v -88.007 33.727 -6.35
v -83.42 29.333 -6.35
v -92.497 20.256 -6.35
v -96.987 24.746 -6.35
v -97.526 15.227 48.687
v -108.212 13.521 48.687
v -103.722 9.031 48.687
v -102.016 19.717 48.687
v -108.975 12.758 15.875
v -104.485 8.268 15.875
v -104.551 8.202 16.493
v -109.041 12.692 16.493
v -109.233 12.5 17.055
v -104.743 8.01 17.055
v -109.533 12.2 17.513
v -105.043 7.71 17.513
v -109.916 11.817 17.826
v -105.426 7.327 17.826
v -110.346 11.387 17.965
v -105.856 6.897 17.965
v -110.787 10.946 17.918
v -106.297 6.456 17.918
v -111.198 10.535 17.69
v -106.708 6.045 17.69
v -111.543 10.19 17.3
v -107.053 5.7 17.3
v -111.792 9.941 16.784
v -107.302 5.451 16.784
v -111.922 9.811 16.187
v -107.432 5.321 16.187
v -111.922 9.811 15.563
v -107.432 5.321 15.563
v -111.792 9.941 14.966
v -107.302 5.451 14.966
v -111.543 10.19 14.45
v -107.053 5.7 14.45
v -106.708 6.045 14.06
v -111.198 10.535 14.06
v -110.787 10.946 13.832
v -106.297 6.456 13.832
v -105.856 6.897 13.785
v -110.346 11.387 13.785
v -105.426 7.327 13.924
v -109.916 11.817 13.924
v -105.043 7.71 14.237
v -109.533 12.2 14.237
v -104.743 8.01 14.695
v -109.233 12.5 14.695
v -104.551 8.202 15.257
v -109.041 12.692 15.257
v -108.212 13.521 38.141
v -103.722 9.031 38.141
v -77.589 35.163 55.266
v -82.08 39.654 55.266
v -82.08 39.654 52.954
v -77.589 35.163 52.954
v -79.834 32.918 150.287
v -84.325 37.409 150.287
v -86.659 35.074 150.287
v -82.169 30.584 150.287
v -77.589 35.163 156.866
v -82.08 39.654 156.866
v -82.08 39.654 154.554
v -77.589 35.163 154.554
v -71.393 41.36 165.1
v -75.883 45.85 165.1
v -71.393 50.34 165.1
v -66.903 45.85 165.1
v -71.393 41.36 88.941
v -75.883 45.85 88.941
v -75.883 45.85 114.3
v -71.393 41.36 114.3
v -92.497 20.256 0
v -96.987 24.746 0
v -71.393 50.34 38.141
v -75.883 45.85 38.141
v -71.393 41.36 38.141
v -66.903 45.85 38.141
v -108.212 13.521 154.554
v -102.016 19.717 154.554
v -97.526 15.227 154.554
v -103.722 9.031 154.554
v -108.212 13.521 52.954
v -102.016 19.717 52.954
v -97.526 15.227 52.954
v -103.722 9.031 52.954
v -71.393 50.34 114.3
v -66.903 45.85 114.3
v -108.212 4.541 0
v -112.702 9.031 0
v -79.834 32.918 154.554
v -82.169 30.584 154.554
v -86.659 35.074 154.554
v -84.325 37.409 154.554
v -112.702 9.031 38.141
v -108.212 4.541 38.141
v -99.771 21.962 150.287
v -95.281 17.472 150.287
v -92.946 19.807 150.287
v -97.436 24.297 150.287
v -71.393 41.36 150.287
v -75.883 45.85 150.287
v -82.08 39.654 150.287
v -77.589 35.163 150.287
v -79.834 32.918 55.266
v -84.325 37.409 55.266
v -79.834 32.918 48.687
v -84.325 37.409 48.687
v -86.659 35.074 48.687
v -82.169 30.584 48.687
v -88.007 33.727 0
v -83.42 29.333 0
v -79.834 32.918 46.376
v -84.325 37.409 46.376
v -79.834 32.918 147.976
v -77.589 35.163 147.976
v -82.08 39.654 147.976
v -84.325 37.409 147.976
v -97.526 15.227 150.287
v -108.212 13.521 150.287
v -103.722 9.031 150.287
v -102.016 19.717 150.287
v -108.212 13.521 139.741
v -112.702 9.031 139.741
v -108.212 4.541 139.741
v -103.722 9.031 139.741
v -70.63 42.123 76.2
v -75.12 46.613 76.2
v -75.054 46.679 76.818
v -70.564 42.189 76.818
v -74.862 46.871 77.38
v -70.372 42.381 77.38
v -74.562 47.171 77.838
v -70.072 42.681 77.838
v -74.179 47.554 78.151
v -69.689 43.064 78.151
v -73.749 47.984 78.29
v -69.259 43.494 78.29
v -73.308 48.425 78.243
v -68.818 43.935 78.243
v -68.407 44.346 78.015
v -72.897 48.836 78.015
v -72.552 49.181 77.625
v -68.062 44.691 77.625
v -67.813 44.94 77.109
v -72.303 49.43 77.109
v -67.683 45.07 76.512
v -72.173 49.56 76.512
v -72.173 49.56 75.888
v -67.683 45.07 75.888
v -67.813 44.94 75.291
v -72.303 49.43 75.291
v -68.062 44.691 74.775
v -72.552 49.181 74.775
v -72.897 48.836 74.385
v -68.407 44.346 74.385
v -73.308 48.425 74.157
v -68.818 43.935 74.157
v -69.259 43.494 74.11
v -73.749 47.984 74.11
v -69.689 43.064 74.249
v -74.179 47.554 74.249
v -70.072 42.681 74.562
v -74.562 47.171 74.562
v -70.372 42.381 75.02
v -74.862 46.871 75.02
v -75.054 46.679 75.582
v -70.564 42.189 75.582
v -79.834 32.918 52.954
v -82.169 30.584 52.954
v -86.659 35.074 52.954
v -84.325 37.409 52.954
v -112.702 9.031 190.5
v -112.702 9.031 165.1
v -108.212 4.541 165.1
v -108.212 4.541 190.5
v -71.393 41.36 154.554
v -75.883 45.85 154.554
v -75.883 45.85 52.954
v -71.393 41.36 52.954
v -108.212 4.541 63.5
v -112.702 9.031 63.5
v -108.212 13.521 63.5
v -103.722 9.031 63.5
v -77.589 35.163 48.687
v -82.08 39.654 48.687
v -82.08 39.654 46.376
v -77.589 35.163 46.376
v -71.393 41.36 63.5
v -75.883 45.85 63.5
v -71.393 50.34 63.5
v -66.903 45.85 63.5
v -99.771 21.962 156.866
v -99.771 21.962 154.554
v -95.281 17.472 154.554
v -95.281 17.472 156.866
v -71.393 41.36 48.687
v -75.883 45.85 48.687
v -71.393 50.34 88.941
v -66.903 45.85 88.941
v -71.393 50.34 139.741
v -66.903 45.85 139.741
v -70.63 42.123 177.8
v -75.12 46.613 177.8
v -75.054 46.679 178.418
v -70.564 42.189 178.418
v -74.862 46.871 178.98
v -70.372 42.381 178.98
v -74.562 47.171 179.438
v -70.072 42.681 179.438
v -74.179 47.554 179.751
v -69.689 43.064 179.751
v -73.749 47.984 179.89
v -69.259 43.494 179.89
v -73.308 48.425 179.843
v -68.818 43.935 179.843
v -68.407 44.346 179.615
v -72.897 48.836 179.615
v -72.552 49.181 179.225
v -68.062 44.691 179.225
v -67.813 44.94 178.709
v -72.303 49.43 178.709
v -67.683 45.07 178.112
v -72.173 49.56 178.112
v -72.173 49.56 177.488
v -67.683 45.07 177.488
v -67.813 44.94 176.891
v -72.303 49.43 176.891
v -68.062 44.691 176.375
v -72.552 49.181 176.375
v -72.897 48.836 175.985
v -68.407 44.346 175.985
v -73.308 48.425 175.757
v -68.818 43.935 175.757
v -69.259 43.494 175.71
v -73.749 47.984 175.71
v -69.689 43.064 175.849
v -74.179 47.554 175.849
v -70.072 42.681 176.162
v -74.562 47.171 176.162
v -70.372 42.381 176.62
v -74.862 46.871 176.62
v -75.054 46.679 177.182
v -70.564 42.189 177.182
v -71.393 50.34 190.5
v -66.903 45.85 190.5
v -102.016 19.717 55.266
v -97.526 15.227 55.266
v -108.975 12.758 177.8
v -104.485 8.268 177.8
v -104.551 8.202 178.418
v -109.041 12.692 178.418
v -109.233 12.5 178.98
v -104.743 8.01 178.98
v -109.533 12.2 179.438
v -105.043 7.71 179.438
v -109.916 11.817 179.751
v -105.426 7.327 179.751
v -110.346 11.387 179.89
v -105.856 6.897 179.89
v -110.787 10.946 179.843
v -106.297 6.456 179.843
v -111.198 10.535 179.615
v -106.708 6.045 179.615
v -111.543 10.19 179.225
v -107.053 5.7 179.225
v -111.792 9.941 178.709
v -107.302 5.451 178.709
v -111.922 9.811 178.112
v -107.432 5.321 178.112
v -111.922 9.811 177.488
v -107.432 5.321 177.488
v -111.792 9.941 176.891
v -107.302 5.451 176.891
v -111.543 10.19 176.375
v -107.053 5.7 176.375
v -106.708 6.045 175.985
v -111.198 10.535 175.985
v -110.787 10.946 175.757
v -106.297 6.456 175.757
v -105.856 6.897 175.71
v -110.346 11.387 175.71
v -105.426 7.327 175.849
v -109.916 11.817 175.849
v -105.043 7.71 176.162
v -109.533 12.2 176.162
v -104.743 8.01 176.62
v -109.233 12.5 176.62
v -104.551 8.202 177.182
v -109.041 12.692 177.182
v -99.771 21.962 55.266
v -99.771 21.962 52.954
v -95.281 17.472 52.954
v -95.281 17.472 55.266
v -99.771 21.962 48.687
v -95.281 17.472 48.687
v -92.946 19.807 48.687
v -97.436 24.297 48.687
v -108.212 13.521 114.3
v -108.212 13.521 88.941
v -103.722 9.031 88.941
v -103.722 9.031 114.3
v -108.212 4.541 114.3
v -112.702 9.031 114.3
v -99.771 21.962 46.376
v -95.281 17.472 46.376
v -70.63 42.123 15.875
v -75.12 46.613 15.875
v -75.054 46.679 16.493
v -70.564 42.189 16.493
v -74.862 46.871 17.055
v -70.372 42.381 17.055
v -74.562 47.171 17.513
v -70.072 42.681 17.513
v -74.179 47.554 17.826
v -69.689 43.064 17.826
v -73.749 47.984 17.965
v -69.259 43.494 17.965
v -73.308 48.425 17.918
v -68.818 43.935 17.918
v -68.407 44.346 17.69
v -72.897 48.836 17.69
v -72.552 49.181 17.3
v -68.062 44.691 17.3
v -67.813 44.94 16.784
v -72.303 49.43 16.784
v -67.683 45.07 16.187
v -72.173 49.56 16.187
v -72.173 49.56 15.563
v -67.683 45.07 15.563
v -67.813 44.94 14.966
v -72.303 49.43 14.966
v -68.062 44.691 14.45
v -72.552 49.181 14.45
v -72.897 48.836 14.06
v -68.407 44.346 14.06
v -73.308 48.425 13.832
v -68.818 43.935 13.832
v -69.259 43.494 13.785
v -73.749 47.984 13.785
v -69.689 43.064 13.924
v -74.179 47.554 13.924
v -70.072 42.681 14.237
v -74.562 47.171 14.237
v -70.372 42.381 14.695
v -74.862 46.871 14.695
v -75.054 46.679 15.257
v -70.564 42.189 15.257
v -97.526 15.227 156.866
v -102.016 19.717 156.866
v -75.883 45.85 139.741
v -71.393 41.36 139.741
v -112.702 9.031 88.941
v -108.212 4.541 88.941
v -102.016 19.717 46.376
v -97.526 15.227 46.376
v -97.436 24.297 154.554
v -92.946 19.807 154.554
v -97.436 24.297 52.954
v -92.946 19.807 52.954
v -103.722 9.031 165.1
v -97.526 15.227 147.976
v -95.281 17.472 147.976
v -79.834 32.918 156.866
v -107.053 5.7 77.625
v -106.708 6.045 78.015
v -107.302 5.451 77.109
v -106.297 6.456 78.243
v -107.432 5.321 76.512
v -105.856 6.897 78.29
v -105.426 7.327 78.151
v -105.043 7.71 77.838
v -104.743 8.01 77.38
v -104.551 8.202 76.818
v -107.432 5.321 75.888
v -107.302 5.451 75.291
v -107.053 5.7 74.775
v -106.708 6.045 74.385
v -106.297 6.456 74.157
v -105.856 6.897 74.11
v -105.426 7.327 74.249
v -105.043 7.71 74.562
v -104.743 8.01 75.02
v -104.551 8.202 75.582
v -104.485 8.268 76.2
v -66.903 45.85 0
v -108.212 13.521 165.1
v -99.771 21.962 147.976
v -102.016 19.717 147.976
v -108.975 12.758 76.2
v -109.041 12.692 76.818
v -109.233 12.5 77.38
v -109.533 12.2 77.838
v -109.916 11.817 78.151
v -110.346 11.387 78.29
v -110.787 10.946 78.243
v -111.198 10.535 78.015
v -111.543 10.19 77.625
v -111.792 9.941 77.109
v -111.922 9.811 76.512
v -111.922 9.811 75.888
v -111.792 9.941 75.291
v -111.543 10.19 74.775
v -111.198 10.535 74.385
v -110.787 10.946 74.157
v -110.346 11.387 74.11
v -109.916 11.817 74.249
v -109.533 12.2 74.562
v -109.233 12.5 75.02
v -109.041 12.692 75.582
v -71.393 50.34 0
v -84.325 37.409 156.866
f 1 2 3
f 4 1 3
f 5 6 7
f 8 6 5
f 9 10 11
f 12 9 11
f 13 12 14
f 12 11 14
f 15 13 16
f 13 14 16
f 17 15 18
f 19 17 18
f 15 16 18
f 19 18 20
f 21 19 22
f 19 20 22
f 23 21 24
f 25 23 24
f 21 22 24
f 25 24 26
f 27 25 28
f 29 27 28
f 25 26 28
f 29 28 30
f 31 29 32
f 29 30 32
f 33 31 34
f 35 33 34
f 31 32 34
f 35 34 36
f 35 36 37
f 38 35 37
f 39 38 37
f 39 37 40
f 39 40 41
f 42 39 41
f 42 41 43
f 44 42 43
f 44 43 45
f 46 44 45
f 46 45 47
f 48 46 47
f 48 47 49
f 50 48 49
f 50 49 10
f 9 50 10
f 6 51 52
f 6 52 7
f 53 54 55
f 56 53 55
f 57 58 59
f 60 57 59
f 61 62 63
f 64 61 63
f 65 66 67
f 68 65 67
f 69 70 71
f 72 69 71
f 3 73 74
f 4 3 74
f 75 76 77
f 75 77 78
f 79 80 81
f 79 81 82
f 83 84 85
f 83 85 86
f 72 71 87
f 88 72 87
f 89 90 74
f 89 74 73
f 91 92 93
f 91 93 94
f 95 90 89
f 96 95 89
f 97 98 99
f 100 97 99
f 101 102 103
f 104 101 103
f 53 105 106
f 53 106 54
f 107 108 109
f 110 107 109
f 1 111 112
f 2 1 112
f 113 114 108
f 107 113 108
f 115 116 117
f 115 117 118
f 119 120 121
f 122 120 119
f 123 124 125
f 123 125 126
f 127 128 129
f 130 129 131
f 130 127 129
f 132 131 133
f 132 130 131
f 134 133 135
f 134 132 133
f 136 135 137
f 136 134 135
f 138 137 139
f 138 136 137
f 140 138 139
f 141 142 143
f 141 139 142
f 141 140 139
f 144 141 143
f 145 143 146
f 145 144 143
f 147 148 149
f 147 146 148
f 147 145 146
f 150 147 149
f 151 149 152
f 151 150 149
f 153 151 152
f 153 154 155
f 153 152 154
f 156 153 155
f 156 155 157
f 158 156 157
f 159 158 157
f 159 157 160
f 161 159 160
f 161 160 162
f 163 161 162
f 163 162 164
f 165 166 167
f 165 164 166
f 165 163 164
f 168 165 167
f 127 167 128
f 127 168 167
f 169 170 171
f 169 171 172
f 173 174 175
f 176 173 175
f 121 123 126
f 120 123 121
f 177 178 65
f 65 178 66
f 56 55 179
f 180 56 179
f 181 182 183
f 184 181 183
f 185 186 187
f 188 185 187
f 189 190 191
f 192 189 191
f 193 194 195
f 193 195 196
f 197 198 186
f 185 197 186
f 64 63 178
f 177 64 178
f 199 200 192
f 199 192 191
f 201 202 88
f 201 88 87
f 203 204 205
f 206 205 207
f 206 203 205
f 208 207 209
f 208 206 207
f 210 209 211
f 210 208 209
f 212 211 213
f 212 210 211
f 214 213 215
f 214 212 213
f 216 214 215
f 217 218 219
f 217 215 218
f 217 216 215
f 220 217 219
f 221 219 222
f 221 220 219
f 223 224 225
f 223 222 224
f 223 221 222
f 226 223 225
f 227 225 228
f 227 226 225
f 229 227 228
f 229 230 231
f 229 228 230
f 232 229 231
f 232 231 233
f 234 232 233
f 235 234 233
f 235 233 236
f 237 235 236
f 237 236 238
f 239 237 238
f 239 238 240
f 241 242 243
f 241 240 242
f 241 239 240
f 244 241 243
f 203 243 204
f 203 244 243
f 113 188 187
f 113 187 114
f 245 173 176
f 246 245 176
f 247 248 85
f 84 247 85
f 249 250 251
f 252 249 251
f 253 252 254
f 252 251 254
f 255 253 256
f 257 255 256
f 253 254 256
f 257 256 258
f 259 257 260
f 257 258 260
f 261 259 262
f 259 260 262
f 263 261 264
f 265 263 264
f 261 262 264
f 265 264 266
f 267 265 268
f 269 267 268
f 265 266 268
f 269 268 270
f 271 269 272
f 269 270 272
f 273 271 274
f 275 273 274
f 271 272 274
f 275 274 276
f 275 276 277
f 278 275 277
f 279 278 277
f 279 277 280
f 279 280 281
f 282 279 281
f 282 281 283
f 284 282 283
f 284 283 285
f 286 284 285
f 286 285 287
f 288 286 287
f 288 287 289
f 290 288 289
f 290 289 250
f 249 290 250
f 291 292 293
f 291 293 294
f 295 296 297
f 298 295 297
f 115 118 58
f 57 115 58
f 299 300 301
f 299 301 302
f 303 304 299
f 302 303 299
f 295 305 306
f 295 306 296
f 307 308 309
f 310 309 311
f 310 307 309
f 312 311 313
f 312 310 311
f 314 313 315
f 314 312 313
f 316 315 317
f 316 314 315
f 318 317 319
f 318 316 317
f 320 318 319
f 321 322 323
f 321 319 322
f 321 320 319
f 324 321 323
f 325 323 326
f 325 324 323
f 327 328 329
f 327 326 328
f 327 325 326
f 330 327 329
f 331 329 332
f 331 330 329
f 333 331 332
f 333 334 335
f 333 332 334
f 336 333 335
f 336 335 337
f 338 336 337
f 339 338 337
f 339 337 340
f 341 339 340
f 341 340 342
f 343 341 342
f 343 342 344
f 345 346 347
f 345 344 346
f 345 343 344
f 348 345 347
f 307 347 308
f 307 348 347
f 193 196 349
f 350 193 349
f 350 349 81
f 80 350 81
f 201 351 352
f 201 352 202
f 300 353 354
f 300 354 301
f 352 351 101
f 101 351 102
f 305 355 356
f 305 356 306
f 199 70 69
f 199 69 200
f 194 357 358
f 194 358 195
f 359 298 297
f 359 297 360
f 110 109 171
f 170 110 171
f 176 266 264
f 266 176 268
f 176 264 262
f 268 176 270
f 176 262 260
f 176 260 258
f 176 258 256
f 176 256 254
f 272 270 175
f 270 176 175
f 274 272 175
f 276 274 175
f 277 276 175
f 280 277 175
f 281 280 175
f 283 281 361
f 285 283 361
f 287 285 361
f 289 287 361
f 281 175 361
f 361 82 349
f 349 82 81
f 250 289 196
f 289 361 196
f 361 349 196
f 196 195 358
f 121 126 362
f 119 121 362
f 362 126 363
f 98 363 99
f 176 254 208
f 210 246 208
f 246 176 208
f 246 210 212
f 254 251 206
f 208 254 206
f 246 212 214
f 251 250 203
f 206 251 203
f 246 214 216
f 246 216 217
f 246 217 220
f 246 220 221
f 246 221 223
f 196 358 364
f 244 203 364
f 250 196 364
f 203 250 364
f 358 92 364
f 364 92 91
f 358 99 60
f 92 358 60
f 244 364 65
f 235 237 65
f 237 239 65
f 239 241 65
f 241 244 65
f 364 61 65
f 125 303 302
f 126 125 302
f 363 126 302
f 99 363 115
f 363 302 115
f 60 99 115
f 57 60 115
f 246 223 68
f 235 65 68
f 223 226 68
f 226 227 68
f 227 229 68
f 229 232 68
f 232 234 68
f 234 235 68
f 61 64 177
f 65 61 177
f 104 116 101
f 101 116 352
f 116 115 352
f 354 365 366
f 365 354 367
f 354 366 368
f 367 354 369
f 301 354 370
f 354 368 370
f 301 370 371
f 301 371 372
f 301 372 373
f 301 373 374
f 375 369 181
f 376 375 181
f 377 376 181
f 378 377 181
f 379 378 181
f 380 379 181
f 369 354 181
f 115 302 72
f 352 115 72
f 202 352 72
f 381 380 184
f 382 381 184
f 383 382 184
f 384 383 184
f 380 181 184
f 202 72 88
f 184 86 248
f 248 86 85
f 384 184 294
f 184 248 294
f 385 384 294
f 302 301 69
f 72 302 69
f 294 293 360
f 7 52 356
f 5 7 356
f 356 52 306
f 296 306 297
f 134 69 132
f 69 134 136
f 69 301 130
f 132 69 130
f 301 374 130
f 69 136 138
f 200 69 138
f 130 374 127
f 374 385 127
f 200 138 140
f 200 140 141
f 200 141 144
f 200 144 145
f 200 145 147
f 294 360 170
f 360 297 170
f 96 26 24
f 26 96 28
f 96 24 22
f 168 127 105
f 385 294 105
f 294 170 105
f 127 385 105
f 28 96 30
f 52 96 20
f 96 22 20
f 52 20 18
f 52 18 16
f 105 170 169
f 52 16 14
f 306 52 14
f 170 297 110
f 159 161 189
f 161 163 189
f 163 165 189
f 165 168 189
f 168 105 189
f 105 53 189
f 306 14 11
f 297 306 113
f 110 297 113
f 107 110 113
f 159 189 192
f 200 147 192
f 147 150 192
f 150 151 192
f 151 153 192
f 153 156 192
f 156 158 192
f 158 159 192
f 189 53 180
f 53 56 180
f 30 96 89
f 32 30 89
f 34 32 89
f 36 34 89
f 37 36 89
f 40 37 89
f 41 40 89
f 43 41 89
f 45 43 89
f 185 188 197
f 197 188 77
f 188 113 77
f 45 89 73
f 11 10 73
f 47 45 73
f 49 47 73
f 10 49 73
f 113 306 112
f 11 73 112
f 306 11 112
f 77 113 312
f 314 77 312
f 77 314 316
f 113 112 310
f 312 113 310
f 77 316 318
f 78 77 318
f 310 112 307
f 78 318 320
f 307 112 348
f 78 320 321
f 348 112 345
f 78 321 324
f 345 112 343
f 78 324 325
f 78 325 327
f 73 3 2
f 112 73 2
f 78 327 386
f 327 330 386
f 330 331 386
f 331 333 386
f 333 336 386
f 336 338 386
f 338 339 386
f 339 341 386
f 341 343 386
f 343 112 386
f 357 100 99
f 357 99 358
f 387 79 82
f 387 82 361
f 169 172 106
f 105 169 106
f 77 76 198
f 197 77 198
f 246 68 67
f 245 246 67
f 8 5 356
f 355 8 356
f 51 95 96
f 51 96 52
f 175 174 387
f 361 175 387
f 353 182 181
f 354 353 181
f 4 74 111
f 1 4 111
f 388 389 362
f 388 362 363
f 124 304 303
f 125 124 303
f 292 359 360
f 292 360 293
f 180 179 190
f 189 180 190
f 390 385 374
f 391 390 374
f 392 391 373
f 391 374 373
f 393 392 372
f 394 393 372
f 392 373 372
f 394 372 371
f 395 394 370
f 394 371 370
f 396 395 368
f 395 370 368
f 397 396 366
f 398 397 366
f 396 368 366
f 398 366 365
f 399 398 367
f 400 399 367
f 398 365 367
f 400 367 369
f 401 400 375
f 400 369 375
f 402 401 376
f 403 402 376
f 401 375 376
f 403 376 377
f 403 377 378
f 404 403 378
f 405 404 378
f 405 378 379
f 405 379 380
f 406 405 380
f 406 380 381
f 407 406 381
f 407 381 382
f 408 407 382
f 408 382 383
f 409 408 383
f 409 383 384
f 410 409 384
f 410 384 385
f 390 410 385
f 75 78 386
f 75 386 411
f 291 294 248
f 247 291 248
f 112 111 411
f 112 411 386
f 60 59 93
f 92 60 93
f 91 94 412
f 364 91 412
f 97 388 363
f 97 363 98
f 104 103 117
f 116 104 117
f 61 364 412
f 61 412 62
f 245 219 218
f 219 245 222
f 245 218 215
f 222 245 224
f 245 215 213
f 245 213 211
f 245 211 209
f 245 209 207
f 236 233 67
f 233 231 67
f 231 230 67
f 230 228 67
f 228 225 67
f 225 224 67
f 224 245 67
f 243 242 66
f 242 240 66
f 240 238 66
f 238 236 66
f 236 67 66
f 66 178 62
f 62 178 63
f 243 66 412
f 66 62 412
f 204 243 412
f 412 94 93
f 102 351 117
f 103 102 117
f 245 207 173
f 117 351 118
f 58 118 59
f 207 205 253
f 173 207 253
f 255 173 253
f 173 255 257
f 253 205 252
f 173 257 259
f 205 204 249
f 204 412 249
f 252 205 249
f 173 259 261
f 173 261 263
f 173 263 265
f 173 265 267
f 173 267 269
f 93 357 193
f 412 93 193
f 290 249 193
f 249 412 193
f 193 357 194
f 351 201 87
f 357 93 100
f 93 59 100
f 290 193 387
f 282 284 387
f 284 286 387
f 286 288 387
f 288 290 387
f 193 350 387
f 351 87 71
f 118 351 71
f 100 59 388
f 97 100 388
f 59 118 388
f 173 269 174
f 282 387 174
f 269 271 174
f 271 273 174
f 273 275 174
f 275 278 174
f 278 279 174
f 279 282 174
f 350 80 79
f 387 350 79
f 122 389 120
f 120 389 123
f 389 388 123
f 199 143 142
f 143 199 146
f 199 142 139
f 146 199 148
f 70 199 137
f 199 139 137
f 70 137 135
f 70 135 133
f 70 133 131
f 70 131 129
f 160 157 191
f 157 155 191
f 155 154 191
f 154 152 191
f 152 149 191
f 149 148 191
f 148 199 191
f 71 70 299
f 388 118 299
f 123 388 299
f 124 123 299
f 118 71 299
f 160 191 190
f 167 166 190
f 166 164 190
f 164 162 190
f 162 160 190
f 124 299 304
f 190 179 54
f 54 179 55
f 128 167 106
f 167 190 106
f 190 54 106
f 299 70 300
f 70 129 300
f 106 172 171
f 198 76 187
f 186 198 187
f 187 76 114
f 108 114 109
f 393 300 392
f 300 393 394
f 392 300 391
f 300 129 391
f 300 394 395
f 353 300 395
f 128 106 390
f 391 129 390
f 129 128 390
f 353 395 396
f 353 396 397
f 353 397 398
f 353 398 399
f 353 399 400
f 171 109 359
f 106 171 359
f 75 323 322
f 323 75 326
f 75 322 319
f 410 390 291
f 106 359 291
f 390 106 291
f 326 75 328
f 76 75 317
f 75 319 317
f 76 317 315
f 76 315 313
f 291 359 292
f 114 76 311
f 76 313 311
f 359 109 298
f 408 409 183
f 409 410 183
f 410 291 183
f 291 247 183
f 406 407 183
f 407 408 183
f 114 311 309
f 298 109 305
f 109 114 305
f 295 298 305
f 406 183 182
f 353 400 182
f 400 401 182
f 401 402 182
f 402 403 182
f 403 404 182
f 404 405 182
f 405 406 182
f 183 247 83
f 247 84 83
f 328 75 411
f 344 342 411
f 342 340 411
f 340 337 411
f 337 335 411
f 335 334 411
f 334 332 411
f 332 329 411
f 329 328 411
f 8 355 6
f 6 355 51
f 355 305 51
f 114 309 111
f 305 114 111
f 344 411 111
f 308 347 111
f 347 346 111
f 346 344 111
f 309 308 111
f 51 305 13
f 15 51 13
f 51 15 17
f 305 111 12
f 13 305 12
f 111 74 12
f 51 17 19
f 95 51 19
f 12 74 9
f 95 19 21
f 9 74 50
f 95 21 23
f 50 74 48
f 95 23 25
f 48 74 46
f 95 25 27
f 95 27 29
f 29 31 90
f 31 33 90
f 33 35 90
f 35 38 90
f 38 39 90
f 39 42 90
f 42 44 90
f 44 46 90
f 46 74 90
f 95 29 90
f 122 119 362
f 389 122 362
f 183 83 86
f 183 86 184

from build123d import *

# Parameters (mm, degrees)
BOSS_EXTRUDE1_DEPTH = 190.5
SKETCH2_W           = 25.35879418
SKETCH2_H           = 6.35
CUT_EXTRUDE1_DEPTH  = 6.35
LPATTERN1_COUNT     = 3
LPATTERN1_PITCH     = 50.8
BOSS_EXTRUDE2_DEPTH = 6.35
SKETCH5_R           = 2.0955
CUT_EXTRUDE2_DEPTH  = 206.304109574
CUT_EXTRUDE3_DEPTH  = 206.304109574


with BuildPart() as part:
    # Sketch1 → Boss-Extrude1 (new body)
    with BuildSketch(Plane.XY):
        Polygon((-108.212086259, 4.54079067), (-66.902908102, 45.849968827), (-71.393036163, 50.340096887), (-112.702214319, 9.030918731), align=None)
    extrude(amount=BOSS_EXTRUDE1_DEPTH)

    # Sketch2 → Cut-Extrude1 (cut)
    with BuildSketch(Plane(origin=(-60.866566525, 60.866566525, 0), x_dir=(0, 0, 1), z_dir=(-0.7071067811865477, 0.7071067811865474, 0))):
        with Locations((152.42060291, -18.061676125)):
            Rectangle(SKETCH2_W, SKETCH2_H)
        with Locations((152.42060291, -70.131676125)):
            Rectangle(SKETCH2_W, SKETCH2_H)
    cut_extrude1 = extrude(amount=-CUT_EXTRUDE1_DEPTH, mode=Mode.SUBTRACT)

    # LPattern1: Cut-Extrude1 ×3
    with Locations(*[(0, 0, -i * LPATTERN1_PITCH) for i in range(1, LPATTERN1_COUNT)]):
        add(cut_extrude1, mode=Mode.SUBTRACT)

    # Sketch3 → Boss-Extrude2 (add)
    with BuildSketch(Plane(origin=(0, 0, 0), x_dir=(-1, 0, 0), z_dir=(0, 0, -1))):
        Polygon((92.496638047, 20.256238882), (96.986766108, 24.746366942), (88.006509986, 33.726623063), (83.419538791, 29.333338138), align=None)
    extrude(amount=BOSS_EXTRUDE2_DEPTH)

    # Sketch5 → Cut-Extrude2 (cut, through all)
    with BuildSketch(Plane(origin=(-56.376438464, 56.376438464, 0), x_dir=(0, 0, -1), z_dir=(0.7071067811865477, -0.7071067811865474, 0))):
        with Locations(Location((-177.8, -70.131676125, 0), (0, 0, 90))):
            Circle(SKETCH5_R)
        with Locations(Location((-76.2, -70.131676125, 0), (0, 0, 90))):
            Circle(SKETCH5_R)
        with Locations(Location((-15.875, -70.131676125, 0), (0, 0, 90))):
            Circle(SKETCH5_R)
    cut_extrude2 = extrude(amount=-CUT_EXTRUDE2_DEPTH, mode=Mode.SUBTRACT)

    # Mirror1: Cut-Extrude2 across plane
    add(cut_extrude2.mirror(Plane(origin=(-31.181058716, -31.181058716, 0), x_dir=(0, 0, 1), z_dir=(-0.7071067811865475, -0.7071067811865477, 0))), mode=Mode.SUBTRACT)

    # Sketch6 → Cut-Extrude3 (cut, through all)
    with BuildSketch(Plane(origin=(-60.866566525, 60.866566525, 0), x_dir=(0, 0, 1), z_dir=(-0.7071067811865477, 0.7071067811865475, 0))):
        Polygon((52.95420291, -21.236676125), (48.68700291, -21.236676125), (48.68700291, -29.999676125), (46.37560291, -29.999676125), (46.37560291, -33.174676125), (48.68700291, -33.174676125), (48.68700291, -36.476676125), (52.95420291, -36.476676125), (52.95420291, -33.174676125), (55.26560291, -33.174676125), (55.26560291, -29.999676125), (52.95420291, -29.999676125), align=None)
        Polygon((154.55420291, -21.236676125), (150.28700291, -21.236676125), (150.28700291, -29.999676125), (147.97560291, -29.999676125), (147.97560291, -33.174676125), (150.28700291, -33.174676125), (150.28700291, -36.476676125), (154.55420291, -36.476676125), (154.55420291, -33.174676125), (156.86560291, -33.174676125), (156.86560291, -29.999676125), (154.55420291, -29.999676125), align=None)
    cut_extrude3 = extrude(amount=-CUT_EXTRUDE3_DEPTH, mode=Mode.SUBTRACT)

    # Mirror2: Cut-Extrude3 across plane
    add(cut_extrude3.mirror(Plane(origin=(-31.181058716, -31.181058716, 0), x_dir=(0, 0, 1), z_dir=(-0.7071067811865475, -0.7071067811865477, 0))), mode=Mode.SUBTRACT)


solid = part.part
